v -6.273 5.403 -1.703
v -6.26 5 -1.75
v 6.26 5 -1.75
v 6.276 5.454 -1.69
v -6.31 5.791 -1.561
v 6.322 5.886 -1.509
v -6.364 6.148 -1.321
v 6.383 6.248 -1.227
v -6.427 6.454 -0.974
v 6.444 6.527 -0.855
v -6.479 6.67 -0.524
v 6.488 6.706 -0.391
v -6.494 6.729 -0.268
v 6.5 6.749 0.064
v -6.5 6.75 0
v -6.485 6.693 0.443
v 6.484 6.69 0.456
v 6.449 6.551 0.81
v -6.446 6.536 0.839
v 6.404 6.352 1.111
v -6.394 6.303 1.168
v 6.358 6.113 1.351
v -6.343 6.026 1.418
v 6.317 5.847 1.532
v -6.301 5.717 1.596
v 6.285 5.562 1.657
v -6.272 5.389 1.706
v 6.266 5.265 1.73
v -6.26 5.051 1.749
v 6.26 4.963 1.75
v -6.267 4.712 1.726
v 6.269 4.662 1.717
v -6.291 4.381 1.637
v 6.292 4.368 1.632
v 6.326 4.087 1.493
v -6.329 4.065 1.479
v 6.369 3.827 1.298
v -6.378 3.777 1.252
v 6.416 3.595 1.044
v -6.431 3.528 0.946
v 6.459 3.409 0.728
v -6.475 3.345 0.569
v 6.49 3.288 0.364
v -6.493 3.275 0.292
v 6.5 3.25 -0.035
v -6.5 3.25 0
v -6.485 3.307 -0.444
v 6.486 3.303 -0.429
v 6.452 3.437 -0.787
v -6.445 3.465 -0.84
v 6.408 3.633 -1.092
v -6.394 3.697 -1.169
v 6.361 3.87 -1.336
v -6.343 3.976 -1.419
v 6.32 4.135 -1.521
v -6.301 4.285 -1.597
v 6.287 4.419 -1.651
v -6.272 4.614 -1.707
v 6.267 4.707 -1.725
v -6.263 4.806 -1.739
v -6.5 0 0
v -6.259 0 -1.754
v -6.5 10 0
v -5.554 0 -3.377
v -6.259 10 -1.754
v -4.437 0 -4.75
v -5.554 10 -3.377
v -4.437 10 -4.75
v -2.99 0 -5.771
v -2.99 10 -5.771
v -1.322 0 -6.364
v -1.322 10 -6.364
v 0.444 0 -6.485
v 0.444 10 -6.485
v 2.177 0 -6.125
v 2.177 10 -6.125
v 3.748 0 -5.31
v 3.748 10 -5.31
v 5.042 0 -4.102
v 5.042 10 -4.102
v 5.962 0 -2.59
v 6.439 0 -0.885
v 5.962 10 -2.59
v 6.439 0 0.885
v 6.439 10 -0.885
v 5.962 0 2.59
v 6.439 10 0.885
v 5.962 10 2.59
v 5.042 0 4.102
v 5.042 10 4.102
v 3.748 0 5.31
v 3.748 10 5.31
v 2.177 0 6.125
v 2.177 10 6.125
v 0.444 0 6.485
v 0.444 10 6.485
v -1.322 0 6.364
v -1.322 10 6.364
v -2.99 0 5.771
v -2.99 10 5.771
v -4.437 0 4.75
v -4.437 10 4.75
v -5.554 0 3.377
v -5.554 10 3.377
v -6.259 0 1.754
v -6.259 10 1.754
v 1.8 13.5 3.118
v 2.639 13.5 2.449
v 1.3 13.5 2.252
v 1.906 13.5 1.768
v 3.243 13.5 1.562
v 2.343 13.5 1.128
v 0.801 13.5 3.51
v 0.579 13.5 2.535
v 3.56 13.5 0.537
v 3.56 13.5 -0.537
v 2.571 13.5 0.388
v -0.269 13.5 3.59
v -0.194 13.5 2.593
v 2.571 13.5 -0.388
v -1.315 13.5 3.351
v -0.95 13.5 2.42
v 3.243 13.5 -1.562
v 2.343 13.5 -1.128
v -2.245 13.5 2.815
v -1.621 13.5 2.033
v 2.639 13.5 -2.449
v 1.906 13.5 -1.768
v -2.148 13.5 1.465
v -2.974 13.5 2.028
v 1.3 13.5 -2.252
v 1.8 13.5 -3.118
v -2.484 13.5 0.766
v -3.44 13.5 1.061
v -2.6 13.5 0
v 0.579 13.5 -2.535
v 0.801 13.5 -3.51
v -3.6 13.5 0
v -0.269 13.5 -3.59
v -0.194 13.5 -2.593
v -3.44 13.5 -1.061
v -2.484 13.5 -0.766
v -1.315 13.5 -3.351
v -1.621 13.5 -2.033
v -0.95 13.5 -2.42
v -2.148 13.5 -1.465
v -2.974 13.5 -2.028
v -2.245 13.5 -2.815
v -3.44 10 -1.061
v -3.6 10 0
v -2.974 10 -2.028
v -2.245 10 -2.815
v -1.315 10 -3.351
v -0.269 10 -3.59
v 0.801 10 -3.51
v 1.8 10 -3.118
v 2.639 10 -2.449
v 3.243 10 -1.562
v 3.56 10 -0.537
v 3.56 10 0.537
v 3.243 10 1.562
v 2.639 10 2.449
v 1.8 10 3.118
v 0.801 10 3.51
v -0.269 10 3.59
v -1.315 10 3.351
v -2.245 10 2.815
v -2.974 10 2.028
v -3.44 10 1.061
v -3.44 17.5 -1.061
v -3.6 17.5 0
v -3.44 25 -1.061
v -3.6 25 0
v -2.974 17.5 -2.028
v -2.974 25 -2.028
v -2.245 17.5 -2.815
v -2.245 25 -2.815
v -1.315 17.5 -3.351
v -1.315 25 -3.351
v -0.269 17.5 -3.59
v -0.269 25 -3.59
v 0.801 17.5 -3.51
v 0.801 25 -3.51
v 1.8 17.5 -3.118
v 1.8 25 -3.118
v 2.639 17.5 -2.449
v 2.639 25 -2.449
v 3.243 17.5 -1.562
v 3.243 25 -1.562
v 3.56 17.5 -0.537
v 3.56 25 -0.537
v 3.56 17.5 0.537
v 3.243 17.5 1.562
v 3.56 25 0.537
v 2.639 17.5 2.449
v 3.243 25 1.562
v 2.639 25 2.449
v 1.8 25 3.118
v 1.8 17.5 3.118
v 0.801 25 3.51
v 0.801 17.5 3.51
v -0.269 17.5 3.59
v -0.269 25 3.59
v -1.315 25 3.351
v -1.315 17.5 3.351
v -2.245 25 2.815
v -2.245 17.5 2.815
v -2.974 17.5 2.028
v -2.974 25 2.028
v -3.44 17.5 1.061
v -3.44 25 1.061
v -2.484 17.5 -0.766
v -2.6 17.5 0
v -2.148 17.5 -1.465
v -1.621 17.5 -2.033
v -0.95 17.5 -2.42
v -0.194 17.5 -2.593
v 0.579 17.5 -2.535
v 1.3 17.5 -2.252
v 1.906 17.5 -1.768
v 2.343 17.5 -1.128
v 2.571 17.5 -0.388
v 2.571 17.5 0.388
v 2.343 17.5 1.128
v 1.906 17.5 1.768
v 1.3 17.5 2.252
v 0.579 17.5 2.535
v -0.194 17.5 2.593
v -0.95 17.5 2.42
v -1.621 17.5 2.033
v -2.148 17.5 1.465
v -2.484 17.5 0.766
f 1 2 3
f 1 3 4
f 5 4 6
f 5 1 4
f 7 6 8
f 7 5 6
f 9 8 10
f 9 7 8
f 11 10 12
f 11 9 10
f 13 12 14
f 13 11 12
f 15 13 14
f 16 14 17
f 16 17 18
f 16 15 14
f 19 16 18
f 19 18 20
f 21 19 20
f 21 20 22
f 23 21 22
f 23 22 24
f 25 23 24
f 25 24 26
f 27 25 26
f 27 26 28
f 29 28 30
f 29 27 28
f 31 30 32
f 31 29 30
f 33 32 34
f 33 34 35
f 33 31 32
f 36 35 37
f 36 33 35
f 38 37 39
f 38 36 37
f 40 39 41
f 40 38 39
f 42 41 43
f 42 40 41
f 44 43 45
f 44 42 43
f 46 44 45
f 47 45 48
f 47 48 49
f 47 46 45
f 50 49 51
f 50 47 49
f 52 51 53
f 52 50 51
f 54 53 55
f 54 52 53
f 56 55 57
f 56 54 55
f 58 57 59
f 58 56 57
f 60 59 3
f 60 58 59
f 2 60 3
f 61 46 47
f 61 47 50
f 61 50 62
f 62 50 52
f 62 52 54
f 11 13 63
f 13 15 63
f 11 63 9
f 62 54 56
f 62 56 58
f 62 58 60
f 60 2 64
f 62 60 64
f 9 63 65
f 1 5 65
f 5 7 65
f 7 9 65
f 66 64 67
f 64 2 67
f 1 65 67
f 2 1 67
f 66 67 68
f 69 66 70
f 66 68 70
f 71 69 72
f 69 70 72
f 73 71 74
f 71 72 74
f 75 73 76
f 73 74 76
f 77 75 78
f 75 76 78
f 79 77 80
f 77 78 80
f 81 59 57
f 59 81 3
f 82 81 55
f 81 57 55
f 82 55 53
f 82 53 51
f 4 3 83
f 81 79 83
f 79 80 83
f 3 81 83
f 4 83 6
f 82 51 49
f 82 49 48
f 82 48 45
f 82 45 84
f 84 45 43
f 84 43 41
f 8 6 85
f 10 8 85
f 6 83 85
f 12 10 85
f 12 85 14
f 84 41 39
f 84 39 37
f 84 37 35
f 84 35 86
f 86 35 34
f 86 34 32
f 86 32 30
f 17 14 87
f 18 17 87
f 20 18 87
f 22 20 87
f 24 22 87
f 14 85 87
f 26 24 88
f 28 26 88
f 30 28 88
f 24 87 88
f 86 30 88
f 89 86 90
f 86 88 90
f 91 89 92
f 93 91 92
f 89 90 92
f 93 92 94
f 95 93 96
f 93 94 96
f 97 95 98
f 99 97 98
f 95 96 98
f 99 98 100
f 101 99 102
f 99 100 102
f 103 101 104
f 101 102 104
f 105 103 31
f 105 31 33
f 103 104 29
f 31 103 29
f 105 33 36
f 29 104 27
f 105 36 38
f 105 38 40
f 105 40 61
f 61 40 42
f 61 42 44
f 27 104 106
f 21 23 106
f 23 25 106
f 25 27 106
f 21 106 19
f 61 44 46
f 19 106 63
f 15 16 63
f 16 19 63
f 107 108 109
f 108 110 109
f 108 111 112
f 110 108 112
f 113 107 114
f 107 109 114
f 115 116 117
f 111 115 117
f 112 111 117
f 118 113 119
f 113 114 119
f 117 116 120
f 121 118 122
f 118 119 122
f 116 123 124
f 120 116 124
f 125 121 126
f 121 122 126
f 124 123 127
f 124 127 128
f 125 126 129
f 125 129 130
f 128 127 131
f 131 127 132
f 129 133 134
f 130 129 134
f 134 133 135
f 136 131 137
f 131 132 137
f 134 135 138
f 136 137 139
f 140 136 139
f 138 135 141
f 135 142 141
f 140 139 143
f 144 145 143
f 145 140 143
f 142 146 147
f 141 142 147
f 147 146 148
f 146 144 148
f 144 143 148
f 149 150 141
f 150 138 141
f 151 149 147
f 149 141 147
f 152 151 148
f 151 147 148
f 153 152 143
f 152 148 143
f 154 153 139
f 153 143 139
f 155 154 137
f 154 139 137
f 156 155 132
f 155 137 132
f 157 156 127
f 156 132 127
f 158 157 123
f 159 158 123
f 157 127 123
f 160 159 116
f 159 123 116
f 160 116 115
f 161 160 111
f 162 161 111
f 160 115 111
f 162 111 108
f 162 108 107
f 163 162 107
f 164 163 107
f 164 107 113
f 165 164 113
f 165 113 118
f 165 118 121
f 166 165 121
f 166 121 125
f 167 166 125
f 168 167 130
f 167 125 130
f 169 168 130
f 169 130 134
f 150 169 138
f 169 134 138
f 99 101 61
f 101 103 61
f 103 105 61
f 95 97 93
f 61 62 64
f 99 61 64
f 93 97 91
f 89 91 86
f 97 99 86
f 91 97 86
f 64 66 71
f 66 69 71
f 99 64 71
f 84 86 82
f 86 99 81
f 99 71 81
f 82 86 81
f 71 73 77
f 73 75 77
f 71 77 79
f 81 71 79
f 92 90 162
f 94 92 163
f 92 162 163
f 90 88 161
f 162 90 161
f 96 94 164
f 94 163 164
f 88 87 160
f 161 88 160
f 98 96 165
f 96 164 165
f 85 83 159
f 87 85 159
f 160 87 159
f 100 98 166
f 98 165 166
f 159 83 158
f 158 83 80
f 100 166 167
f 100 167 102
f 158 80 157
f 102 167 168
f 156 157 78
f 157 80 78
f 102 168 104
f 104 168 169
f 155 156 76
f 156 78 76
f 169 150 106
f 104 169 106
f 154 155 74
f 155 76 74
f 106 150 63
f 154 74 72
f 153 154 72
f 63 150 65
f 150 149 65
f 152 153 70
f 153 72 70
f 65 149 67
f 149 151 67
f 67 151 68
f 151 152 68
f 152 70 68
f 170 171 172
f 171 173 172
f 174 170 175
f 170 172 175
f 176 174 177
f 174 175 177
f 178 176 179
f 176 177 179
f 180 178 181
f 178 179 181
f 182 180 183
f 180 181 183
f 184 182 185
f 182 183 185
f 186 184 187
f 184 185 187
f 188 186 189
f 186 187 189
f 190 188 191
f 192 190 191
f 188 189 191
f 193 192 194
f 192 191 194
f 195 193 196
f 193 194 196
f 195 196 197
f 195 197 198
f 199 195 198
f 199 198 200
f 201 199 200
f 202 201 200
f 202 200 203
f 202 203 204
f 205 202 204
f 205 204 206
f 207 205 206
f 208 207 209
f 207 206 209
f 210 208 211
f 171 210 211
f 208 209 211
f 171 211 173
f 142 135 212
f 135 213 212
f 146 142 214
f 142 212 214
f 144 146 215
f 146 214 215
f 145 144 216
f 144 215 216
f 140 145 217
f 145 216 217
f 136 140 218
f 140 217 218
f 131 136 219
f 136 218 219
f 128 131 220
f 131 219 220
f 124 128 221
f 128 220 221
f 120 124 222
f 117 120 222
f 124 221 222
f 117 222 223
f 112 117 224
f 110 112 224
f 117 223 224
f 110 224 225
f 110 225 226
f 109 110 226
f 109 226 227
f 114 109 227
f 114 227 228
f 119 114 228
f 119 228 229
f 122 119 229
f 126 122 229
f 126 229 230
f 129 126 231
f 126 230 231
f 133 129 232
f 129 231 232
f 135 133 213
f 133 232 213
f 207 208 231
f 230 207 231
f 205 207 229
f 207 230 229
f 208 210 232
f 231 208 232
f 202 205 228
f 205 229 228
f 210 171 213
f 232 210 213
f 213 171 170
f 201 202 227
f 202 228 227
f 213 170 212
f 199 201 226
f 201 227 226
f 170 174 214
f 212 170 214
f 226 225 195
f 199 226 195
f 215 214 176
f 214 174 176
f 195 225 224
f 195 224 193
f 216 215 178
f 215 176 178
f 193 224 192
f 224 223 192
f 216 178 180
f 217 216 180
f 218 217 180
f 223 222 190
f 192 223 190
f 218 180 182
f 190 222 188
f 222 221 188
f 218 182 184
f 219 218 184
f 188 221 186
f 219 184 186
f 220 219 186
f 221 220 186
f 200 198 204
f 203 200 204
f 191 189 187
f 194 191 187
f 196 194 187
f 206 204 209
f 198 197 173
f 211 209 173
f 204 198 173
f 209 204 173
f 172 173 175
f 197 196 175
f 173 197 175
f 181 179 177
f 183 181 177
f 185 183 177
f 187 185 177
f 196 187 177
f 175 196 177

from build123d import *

# Parameters (mm, degrees)
CUT_EXTRUDE1_DEPTH      = 27.636441204
CUT_EXTRUDE1_DEPTH_BACK = 27.636441204
SKETCH2_R               = 1.75


with BuildPart() as part:
    # Sketch1 → Revolve1 (revolve)
    with BuildSketch(Plane.XY):
        Polygon((0, 0), (-6.5, 0), (-6.5, 10), (-3.6, 10), (-3.6, 13.5), (-2.6, 13.5), (-2.6, 17.5), (-3.6, 17.5), (-3.6, 25), (0, 25), align=None)
    revolve(axis=Axis((0, 25, 0), (0, -1, 0)))

    # Sketch2 → Cut-Extrude1 (cut, two sides: drawn at the far end of the back side and taken through both)
    with BuildSketch(Plane(origin=(0, 0, 0), x_dir=(0, 0, -1), z_dir=(1, 0, 0)).offset(-CUT_EXTRUDE1_DEPTH_BACK)):
        with Locations((0, 5)):
            Circle(SKETCH2_R)
    extrude(amount=CUT_EXTRUDE1_DEPTH + CUT_EXTRUDE1_DEPTH_BACK, mode=Mode.SUBTRACT)


solid = part.part
